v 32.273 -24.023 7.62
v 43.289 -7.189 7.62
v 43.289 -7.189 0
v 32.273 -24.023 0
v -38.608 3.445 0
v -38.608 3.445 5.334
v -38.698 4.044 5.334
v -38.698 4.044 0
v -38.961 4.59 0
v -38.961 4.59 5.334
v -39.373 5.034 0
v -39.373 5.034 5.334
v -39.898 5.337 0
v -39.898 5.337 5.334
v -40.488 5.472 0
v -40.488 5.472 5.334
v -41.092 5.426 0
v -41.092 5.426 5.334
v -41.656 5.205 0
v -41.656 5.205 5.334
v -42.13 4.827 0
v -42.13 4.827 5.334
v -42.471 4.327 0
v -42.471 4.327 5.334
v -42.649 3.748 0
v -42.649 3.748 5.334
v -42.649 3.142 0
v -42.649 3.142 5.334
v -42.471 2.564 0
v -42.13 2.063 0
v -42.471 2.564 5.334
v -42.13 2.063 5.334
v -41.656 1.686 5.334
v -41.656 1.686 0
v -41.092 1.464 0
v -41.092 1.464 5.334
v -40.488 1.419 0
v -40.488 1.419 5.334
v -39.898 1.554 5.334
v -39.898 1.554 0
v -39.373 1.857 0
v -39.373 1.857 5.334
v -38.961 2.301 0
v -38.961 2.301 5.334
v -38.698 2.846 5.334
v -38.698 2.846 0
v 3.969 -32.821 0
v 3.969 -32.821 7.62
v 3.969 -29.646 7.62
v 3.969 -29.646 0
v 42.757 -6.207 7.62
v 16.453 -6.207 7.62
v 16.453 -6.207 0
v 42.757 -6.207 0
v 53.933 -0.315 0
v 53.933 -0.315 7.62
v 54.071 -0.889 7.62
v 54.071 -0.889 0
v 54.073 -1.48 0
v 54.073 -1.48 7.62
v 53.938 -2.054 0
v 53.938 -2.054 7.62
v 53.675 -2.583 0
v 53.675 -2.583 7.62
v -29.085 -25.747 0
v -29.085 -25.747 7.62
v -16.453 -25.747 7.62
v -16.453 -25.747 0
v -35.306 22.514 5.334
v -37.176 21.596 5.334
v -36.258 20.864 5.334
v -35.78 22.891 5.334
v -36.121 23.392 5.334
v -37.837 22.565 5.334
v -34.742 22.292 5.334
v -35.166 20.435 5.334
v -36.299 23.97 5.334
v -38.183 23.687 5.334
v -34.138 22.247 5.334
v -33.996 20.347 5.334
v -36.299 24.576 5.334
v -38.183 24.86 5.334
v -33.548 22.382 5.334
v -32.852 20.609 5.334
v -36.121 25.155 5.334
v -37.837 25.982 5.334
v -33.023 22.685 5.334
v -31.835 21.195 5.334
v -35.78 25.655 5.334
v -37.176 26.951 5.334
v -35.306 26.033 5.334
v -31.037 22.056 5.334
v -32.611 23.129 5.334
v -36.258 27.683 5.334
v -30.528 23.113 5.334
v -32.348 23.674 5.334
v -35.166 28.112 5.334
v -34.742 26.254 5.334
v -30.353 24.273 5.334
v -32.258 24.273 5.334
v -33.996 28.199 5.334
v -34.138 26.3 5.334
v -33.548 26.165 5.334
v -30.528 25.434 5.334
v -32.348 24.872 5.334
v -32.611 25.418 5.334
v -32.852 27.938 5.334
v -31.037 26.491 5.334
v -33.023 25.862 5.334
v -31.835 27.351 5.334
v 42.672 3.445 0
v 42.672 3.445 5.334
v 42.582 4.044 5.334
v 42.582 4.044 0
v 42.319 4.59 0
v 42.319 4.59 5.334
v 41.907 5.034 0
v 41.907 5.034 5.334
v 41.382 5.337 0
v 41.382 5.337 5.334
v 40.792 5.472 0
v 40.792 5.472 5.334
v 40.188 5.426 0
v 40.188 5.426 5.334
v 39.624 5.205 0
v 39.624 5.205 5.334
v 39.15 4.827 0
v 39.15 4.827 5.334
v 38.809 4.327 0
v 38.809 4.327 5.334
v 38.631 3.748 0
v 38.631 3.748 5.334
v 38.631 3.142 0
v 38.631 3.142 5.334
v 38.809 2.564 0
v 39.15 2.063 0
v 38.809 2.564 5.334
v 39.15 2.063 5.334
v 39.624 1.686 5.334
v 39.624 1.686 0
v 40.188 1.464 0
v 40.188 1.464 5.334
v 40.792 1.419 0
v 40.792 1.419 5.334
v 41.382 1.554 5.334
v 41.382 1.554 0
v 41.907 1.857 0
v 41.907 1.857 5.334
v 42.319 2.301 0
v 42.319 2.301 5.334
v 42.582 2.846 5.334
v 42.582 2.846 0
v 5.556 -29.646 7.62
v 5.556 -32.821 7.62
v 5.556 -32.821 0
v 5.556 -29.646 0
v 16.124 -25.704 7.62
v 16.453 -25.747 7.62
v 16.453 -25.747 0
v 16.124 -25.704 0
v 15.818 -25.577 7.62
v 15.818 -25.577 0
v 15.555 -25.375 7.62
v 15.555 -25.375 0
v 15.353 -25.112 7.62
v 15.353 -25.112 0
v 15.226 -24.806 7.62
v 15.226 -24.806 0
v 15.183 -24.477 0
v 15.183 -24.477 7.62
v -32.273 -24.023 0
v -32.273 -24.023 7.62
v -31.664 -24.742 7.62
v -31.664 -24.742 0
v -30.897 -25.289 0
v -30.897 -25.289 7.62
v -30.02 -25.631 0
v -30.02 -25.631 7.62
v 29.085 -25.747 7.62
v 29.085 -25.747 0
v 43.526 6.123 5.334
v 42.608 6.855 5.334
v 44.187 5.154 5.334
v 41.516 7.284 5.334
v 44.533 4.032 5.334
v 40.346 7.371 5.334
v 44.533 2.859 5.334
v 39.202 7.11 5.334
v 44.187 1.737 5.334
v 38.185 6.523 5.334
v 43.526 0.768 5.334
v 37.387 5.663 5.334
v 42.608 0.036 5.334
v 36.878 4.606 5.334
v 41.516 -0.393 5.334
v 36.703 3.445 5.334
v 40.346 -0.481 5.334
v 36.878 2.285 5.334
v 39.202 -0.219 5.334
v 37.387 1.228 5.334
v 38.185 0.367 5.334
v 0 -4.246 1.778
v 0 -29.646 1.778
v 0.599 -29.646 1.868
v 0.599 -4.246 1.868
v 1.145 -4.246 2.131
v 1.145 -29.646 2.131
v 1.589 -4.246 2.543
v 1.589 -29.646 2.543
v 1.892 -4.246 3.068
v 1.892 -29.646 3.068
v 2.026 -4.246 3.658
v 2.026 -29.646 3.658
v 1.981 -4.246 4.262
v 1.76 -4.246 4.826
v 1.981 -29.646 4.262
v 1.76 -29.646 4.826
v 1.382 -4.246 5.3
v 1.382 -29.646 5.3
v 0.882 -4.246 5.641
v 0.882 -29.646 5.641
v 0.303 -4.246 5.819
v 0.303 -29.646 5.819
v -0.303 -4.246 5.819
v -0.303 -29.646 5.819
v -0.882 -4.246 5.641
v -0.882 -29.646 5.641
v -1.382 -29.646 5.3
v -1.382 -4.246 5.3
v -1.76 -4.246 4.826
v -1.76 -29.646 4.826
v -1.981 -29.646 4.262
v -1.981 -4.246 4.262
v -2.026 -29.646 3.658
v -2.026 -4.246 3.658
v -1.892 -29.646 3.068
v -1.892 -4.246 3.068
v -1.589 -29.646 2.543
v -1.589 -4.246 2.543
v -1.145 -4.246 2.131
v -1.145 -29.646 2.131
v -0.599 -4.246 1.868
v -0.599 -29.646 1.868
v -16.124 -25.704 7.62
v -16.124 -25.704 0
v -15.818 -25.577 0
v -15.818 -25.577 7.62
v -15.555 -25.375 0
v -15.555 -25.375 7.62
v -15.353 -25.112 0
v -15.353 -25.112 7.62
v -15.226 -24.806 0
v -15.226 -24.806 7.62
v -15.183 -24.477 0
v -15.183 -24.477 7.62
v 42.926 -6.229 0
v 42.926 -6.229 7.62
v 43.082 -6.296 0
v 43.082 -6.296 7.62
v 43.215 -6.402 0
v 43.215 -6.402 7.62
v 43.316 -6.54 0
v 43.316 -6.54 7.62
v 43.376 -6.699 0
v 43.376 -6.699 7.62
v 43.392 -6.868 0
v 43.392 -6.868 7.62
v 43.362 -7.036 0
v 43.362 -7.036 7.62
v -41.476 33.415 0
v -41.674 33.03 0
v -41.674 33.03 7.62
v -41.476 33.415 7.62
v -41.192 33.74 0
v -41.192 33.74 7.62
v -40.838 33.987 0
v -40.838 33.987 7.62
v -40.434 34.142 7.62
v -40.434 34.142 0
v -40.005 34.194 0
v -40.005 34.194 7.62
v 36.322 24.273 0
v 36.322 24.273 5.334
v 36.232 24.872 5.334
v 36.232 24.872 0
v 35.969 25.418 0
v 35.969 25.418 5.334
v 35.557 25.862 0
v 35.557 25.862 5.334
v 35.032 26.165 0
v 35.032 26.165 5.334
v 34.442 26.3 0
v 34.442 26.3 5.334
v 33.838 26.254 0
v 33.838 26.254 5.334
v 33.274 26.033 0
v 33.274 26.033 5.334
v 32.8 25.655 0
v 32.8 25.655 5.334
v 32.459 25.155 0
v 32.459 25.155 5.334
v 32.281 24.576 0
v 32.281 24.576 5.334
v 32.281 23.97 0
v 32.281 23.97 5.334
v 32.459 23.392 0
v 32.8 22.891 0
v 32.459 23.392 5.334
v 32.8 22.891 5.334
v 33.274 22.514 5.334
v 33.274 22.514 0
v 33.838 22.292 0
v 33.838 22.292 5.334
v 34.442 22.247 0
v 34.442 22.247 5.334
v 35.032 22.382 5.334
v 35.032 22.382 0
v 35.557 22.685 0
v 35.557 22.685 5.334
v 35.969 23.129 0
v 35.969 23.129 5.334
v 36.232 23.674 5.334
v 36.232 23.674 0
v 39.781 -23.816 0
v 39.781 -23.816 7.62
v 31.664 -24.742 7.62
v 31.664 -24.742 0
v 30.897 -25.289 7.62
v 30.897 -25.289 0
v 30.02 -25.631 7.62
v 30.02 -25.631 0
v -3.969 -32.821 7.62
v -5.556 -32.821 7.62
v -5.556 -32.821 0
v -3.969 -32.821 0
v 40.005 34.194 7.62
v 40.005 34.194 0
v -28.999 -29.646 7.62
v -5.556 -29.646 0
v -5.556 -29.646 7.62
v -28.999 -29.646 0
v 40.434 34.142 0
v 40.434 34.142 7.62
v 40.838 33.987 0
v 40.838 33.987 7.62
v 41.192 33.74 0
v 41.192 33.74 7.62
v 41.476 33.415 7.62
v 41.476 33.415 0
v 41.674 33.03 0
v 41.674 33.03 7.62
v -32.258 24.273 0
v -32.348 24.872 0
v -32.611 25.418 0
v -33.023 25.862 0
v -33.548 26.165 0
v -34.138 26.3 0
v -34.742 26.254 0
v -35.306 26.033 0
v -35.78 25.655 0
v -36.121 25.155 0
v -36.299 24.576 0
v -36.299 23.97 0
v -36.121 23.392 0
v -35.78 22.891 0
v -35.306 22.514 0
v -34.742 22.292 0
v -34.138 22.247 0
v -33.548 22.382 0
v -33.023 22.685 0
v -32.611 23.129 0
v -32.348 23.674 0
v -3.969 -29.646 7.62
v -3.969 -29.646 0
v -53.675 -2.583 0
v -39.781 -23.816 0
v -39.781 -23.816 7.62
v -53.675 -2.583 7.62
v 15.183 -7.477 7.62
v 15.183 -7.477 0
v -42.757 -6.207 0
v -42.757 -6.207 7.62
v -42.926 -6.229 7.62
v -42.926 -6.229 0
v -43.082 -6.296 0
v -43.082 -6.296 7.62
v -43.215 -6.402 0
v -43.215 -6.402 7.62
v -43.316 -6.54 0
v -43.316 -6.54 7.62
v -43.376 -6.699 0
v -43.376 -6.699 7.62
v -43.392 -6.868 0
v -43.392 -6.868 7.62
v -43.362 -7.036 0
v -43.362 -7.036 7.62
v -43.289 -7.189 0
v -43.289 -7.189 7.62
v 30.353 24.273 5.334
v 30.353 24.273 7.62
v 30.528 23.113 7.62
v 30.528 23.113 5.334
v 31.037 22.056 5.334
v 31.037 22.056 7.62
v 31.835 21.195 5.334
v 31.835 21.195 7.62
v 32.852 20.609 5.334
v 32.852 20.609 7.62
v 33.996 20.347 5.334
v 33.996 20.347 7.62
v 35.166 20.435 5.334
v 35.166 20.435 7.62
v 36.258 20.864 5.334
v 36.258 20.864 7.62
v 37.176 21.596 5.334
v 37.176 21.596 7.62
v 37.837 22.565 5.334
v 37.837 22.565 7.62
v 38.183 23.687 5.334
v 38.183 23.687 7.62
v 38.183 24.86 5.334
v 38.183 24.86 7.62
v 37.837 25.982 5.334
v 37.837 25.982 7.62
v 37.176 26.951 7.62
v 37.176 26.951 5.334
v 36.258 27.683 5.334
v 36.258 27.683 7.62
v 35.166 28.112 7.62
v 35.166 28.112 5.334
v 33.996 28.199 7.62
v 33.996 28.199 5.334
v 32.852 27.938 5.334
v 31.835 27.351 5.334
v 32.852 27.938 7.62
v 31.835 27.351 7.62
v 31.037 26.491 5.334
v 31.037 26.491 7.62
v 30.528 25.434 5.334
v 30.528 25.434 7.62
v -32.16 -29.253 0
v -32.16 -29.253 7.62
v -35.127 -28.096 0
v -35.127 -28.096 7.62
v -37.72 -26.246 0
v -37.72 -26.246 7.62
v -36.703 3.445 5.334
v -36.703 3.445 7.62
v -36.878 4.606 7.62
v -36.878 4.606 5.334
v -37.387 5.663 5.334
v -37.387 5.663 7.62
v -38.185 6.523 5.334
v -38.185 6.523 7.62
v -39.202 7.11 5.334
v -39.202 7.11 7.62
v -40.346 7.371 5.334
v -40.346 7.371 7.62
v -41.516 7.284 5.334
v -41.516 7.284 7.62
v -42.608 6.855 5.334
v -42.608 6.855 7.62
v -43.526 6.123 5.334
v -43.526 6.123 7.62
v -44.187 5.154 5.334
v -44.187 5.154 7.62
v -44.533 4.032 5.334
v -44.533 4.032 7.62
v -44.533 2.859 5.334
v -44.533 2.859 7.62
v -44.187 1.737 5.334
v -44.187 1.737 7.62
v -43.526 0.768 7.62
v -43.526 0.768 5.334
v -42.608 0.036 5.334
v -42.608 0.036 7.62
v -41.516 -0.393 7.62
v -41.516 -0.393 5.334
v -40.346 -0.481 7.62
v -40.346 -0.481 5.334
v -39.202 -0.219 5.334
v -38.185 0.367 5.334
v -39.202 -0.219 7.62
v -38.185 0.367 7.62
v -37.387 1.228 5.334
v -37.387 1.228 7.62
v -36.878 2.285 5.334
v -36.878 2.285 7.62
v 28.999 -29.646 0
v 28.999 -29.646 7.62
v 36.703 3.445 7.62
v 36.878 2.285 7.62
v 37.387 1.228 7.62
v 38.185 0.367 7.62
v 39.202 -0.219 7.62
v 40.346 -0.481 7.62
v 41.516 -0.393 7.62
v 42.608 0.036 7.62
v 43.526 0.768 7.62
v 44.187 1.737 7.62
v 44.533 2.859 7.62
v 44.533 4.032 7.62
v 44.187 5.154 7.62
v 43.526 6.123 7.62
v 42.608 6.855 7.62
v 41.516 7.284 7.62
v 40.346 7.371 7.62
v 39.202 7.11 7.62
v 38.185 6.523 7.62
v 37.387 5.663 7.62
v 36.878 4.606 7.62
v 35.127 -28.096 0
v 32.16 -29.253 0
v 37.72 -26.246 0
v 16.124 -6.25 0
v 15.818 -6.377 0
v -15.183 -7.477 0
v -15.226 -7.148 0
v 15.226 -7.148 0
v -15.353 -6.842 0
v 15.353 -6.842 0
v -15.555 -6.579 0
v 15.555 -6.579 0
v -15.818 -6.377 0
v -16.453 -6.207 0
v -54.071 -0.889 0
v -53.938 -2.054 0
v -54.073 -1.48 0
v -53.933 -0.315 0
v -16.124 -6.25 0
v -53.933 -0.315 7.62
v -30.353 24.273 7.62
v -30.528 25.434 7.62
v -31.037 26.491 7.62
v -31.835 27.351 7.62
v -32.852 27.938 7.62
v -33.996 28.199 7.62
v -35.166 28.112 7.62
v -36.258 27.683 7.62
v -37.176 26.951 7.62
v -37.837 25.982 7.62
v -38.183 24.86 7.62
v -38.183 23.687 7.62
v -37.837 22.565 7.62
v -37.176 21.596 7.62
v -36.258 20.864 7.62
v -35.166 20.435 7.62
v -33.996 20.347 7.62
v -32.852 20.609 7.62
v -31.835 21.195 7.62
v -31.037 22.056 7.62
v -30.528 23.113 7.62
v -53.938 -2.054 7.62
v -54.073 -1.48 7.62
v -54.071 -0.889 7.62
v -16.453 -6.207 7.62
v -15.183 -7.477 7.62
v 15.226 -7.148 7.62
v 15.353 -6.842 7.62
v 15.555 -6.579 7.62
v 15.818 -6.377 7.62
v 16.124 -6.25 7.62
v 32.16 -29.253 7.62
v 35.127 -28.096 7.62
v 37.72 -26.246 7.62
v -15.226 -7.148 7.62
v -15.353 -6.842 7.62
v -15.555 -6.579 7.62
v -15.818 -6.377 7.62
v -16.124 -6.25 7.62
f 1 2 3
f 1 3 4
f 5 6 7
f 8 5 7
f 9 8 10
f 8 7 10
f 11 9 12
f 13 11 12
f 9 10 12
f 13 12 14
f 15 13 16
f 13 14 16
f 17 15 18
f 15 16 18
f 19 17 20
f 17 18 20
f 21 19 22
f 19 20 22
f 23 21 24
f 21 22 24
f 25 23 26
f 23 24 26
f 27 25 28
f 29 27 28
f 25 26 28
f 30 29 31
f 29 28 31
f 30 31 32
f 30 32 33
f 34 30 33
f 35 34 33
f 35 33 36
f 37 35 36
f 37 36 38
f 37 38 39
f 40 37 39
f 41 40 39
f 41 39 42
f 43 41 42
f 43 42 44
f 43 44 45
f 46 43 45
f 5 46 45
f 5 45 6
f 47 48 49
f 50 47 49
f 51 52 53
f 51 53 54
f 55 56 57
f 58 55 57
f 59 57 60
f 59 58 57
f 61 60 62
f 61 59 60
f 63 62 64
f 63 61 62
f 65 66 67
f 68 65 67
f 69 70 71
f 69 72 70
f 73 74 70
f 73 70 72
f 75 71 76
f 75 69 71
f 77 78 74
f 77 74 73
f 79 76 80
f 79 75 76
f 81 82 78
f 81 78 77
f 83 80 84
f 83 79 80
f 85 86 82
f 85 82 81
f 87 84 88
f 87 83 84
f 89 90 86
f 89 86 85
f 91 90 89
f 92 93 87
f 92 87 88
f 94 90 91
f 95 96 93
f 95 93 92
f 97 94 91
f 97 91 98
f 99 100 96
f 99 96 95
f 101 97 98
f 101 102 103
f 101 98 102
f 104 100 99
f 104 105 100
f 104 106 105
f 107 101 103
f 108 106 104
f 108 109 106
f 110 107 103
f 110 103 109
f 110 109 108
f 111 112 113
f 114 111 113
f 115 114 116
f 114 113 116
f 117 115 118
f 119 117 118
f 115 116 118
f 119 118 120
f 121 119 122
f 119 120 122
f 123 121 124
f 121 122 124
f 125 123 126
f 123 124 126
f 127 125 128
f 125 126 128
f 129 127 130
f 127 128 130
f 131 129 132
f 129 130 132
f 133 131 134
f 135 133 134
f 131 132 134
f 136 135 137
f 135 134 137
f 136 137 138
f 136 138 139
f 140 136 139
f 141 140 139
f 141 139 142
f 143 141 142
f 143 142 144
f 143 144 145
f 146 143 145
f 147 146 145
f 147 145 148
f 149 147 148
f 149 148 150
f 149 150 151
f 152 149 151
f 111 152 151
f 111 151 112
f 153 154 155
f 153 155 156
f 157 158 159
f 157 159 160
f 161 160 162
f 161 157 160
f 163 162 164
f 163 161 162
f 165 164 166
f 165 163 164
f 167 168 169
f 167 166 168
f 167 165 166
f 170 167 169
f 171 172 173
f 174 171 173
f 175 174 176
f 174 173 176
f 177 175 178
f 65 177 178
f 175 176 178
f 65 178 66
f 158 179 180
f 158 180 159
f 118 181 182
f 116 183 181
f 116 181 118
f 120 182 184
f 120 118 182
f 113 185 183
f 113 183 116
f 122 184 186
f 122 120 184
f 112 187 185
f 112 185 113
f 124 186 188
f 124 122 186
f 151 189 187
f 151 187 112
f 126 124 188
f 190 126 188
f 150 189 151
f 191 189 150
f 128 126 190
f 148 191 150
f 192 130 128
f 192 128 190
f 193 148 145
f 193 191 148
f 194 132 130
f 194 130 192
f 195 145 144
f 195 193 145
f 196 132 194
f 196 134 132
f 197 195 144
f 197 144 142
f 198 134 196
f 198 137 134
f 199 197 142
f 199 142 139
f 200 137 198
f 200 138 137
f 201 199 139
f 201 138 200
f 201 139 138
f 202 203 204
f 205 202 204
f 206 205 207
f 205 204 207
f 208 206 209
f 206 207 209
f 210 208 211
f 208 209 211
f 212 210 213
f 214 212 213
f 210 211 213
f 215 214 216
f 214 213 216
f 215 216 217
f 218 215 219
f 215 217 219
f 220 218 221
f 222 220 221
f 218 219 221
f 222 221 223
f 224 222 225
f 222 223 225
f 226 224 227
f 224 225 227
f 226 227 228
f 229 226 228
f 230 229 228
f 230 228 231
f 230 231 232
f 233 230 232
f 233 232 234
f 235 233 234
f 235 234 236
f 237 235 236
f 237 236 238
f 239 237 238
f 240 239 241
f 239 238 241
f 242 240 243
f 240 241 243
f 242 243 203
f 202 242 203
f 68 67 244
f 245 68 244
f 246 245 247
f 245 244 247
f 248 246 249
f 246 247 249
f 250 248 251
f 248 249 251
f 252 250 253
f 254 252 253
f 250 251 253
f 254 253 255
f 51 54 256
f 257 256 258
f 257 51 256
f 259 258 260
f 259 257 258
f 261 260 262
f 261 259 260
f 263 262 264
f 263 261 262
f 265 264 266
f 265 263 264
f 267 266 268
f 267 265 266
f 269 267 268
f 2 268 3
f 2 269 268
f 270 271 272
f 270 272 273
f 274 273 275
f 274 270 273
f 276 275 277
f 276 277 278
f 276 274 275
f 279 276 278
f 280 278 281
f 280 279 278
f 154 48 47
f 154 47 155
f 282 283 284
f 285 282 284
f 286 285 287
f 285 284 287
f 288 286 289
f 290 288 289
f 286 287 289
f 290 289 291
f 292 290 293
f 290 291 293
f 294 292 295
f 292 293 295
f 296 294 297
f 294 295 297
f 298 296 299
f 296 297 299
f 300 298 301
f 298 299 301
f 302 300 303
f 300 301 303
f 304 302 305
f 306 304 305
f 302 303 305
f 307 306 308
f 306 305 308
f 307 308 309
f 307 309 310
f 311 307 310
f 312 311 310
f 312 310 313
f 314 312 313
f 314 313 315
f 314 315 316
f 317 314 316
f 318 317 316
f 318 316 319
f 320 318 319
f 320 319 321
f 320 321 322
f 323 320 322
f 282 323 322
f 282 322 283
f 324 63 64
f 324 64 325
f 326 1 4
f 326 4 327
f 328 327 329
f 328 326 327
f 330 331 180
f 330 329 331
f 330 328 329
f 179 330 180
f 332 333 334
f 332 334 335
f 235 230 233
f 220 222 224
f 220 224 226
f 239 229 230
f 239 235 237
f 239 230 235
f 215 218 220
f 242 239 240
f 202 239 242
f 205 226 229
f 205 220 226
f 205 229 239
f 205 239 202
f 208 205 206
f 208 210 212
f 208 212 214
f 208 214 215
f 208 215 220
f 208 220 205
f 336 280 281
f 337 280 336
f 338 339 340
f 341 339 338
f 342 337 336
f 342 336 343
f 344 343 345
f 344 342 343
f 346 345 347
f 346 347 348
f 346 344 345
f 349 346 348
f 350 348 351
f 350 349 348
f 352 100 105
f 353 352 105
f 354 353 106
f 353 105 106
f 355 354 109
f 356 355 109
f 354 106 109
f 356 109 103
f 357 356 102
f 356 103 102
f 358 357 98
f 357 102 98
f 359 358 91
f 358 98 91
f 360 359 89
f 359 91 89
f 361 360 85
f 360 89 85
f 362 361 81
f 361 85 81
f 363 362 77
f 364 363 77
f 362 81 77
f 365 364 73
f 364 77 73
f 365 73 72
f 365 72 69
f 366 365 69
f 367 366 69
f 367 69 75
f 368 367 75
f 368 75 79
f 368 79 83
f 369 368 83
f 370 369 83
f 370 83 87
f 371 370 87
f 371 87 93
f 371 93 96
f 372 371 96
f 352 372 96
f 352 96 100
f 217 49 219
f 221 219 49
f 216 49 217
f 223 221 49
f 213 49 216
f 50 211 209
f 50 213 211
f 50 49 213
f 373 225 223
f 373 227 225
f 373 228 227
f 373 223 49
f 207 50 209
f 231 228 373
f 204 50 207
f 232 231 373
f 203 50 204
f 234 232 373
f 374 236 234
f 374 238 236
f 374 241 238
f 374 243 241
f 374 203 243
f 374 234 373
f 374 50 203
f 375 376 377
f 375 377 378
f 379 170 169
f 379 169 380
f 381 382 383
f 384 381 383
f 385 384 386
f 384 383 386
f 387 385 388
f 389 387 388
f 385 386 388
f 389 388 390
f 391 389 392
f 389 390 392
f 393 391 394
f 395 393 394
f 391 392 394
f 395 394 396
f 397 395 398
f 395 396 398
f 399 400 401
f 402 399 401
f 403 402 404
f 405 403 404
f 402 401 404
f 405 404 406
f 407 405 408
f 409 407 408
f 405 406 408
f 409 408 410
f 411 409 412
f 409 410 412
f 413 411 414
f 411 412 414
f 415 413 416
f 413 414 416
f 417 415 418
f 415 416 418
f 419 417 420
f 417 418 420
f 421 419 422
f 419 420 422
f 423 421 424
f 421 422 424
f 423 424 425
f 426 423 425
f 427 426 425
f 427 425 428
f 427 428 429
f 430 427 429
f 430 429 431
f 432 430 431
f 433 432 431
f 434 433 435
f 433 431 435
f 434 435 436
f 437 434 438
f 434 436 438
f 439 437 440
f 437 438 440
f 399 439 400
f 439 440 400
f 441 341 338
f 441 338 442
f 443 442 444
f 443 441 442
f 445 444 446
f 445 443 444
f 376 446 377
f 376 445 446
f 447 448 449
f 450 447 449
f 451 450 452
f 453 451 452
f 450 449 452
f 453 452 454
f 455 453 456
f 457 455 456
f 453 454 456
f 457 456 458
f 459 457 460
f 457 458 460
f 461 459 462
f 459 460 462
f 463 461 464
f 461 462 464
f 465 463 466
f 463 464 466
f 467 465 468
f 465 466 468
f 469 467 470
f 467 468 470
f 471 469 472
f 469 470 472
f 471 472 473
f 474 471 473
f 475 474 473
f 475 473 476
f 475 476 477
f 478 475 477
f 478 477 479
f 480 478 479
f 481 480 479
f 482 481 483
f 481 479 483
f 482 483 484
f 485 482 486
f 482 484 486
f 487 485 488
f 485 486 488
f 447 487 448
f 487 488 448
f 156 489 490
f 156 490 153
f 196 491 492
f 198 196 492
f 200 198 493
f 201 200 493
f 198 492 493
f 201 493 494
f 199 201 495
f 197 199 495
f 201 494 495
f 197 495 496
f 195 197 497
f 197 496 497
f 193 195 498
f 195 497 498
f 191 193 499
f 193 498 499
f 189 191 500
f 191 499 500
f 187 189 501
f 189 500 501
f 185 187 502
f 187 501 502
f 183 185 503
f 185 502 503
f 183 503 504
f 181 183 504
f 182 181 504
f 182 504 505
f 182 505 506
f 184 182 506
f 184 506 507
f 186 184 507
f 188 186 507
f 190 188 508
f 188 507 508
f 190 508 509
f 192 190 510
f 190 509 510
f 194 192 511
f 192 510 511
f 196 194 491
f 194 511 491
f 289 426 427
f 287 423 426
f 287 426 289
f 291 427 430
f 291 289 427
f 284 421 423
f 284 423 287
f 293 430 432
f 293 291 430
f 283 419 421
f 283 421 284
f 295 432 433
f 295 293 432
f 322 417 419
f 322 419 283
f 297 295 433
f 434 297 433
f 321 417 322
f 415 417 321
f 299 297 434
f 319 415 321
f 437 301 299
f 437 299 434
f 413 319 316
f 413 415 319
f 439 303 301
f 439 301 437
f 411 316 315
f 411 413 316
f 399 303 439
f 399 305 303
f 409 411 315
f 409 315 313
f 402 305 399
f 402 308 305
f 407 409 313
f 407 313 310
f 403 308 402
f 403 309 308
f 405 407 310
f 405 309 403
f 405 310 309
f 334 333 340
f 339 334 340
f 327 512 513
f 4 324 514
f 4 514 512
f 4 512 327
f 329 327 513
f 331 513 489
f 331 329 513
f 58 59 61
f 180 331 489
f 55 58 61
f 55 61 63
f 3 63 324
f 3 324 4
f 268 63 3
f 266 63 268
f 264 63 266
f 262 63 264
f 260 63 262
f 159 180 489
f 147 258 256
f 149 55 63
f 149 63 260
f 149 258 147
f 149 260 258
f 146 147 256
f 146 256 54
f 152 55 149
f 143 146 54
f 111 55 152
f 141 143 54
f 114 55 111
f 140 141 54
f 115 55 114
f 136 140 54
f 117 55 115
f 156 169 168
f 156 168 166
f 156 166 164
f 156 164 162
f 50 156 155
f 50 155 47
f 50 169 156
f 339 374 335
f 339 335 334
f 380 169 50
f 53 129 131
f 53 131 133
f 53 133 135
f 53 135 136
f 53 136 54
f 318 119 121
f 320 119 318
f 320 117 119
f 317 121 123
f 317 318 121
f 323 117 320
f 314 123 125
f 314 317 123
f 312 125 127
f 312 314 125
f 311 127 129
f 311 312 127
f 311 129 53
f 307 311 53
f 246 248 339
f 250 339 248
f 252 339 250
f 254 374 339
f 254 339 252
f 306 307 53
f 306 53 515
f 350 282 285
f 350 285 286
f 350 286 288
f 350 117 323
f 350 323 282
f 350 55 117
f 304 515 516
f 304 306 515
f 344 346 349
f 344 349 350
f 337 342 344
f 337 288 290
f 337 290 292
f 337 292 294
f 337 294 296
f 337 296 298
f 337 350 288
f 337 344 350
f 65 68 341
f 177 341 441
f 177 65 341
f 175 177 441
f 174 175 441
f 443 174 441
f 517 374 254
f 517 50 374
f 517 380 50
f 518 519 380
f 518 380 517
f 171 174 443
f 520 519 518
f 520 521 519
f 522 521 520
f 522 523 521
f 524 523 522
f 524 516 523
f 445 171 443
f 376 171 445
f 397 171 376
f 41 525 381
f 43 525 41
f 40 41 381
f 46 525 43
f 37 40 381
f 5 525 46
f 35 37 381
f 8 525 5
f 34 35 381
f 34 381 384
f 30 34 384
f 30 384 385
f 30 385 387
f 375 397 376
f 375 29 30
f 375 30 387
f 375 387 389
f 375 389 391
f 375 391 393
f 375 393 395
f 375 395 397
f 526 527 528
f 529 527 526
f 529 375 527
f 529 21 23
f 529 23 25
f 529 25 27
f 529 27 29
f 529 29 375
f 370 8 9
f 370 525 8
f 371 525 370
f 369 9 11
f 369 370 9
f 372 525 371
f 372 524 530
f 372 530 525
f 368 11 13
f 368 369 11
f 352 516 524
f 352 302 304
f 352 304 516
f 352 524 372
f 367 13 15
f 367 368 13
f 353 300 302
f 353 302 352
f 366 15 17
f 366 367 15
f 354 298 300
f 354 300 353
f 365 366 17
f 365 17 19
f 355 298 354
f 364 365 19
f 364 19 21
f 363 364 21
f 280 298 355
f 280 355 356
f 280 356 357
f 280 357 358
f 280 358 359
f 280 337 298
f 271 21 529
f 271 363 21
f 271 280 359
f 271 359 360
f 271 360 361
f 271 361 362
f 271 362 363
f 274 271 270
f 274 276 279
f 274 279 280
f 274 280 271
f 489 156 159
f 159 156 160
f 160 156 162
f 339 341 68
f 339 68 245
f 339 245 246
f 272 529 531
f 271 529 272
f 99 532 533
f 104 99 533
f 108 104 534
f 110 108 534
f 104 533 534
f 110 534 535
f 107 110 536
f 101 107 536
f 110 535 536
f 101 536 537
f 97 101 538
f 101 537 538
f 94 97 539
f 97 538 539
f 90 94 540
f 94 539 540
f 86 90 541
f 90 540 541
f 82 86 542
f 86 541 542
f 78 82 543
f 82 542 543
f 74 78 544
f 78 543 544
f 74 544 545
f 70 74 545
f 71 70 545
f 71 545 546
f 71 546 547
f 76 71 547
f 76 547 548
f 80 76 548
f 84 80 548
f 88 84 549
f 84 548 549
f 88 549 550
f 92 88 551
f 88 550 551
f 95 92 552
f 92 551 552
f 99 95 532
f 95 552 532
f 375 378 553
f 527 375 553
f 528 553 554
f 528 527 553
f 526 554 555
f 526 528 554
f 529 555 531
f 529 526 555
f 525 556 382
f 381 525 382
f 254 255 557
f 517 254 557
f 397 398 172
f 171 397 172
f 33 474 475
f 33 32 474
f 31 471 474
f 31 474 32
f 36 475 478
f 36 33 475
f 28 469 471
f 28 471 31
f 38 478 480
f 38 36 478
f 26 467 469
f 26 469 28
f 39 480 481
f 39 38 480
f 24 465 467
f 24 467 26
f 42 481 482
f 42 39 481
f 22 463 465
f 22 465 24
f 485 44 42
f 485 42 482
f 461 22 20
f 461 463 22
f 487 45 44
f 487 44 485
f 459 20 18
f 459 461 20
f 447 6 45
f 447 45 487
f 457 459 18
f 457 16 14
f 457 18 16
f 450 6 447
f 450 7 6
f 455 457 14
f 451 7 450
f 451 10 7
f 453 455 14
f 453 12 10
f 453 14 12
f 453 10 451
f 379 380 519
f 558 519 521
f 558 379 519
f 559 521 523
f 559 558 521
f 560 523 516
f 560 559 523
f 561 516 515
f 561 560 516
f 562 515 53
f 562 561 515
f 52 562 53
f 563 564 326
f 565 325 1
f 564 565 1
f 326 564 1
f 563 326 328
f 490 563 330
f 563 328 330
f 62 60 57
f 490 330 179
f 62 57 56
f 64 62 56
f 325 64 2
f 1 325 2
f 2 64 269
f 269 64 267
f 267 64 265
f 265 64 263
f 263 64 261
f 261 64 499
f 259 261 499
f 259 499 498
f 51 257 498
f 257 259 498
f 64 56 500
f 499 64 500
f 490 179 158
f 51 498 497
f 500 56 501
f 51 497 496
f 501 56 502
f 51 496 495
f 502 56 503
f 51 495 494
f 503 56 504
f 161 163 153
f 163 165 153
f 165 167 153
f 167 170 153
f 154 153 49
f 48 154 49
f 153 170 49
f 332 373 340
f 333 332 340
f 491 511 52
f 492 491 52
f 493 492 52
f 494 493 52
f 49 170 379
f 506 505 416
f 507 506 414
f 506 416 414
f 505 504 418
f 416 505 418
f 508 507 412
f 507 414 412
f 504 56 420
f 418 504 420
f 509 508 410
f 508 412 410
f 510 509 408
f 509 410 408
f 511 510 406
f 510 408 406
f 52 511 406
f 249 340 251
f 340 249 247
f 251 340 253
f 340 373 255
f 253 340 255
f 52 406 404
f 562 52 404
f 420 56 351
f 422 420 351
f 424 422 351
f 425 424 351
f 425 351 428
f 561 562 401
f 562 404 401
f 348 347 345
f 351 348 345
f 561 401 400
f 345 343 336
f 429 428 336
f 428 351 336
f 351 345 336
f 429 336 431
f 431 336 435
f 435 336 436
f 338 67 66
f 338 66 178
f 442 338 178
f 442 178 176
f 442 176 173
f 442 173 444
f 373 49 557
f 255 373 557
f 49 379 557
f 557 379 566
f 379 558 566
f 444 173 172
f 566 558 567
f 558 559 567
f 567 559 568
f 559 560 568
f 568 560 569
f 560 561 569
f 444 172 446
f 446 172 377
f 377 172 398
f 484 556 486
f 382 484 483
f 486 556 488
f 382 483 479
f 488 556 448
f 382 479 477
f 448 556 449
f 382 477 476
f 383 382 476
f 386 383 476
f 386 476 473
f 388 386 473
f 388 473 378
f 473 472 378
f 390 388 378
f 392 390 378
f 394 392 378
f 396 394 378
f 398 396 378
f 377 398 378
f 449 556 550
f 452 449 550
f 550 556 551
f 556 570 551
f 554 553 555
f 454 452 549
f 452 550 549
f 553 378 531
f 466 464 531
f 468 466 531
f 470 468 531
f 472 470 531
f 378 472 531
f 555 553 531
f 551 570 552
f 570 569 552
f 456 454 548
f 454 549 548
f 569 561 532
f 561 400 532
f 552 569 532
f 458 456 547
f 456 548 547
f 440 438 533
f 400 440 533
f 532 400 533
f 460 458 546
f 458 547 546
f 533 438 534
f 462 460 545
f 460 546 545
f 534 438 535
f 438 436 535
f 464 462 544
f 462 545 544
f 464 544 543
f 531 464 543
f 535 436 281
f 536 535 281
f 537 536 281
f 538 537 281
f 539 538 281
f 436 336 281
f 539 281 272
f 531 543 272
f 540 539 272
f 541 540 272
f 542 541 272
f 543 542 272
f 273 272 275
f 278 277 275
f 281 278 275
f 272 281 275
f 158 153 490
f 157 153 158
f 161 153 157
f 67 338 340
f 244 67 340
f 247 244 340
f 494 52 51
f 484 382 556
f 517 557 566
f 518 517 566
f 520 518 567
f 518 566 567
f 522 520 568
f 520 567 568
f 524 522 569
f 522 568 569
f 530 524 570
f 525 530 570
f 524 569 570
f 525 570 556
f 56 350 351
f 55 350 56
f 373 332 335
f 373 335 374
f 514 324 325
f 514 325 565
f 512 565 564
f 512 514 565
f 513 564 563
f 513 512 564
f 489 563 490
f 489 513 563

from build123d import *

# Parameters (mm, degrees)
BOSS_EXTRUDE1_DEPTH = 7.62
CUT_EXTRUDE4_DEPTH  = 65.443482206
SKETCH8_R           = 2.032
CUT_EXTRUDE6_DEPTH  = 65.443482206
SKETCH9_R           = 2.032
CUT_EXTRUDE7_DEPTH  = 25.4
SKETCH11_R          = 3.937
CUT_EXTRUDE9_DEPTH  = 2.286
SKETCH12_W          = 1.5875
SKETCH12_H          = 3.175
BOSS_EXTRUDE2_DEPTH = 7.62


with BuildPart() as part:
    # Sketch2 → Boss-Extrude1 (new body)
    with BuildSketch(Plane.XY):
        with BuildLine():
            Line((-53.9331315, -0.315391151), (-41.673792668, 33.030010472))
            ThreePointArc((-41.673792668, 33.030010472), (-41.022456018, 33.874587748), (-40.005, 34.194483756))
            Line((-40.005, 34.194483756), (40.005, 34.194483756))
            ThreePointArc((40.005, 34.194483756), (41.022456018, 33.874587748), (41.673792668, 33.030010472))
            Line((41.673792668, 33.030010472), (53.9331315, -0.315391151))
            ThreePointArc((53.9331315, -0.315391151), (54.072783991, -1.479661595), (53.674573059, -2.582592481))
            Line((53.674573059, -2.582592481), (39.780650937, -23.816388011))
            ThreePointArc((39.780650937, -23.816388011), (35.127277075, -28.095614939), (28.998611748, -29.64646397))
            Line((28.998611748, -29.64646397), (-28.998611748, -29.64646397))
            ThreePointArc((-28.998611748, -29.64646397), (-35.127277075, -28.095614939), (-39.780650937, -23.816388011))
            Line((-39.780650937, -23.816388011), (-53.674573059, -2.582592481))
            ThreePointArc((-53.674573059, -2.582592481), (-54.072783991, -1.479661595), (-53.9331315, -0.315391151))
        make_face()
    extrude(amount=BOSS_EXTRUDE1_DEPTH)

    # Sketch6 → Cut-Extrude4 (cut, through all)
    with BuildSketch(Plane.XY.offset(7.62)):
        with BuildLine():
            Line((-43.288518763, -7.189330581), (-32.273407011, -24.02349941))
            ThreePointArc((-32.273407011, -24.02349941), (-30.897448537, -25.288826187), (-29.085260384, -25.747397522))
            Line((-29.085260384, -25.747397522), (-16.452977044, -25.747397522))
            ThreePointArc((-16.452977044, -25.747397522), (-15.554951432, -25.375423134), (-15.182977044, -24.477397522))
            Line((-15.182977044, -24.477397522), (-15.182977044, -7.476646933))
            ThreePointArc((-15.182977044, -7.476646933), (-15.554951432, -6.578621321), (-16.452977044, -6.206646933))
            Line((-16.452977044, -6.206646933), (-42.757160992, -6.206646933))
            ThreePointArc((-42.757160992, -6.206646933), (-43.315732436, -6.539615574), (-43.288518763, -7.189330581))
        make_face()
        with BuildLine():
            Line((43.288518763, -7.189330581), (32.273407011, -24.02349941))
            ThreePointArc((32.273407011, -24.02349941), (30.897448537, -25.288826187), (29.085260384, -25.747397522))
            Line((29.085260384, -25.747397522), (16.452977044, -25.747397522))
            ThreePointArc((16.452977044, -25.747397522), (15.554951432, -25.375423134), (15.182977044, -24.477397522))
            Line((15.182977044, -24.477397522), (15.182977044, -7.476646933))
            ThreePointArc((15.182977044, -7.476646933), (15.554951432, -6.578621321), (16.452977044, -6.206646933))
            Line((16.452977044, -6.206646933), (42.757160992, -6.206646933))
            ThreePointArc((42.757160992, -6.206646933), (43.315732436, -6.539615574), (43.288518763, -7.189330581))
        make_face()
    extrude(amount=-CUT_EXTRUDE4_DEPTH, mode=Mode.SUBTRACT)

    # Sketch8 → Cut-Extrude6 (cut, through all)
    with BuildSketch(Plane.XY.offset(7.62)):
        with Locations((-40.64, 3.445353067)):
            Circle(SKETCH8_R)
        with Locations((-34.29, 24.273353067)):
            Circle(SKETCH8_R)
        with Locations((40.64, 3.445353067)):
            Circle(SKETCH8_R)
        with Locations((34.29, 24.273353067)):
            Circle(SKETCH8_R)
    extrude(amount=-CUT_EXTRUDE6_DEPTH, mode=Mode.SUBTRACT)

    # Sketch9 → Cut-Extrude7 (cut)
    with BuildSketch(Plane.XZ.offset(29.64646397)):
        with Locations(Location((0, 3.81, 0), (0, 0, 270))):
            Circle(SKETCH9_R)
    extrude(amount=-CUT_EXTRUDE7_DEPTH, mode=Mode.SUBTRACT)

    # Sketch11 → Cut-Extrude9 (cut)
    with BuildSketch(Plane.XY.offset(7.62)):
        with Locations((-34.29, 24.273353067)):
            Circle(SKETCH11_R)
        with Locations((-40.64, 3.445353067)):
            Circle(SKETCH11_R)
        with Locations(Location((40.64, 3.445353067, 0), (0, 0, 180))):
            Circle(SKETCH11_R)
        with Locations(Location((34.29, 24.273353067, 0), (0, 0, 180))):
            Circle(SKETCH11_R)
    extrude(amount=-CUT_EXTRUDE9_DEPTH, mode=Mode.SUBTRACT)

    # Sketch12 → Boss-Extrude2 (add)
    with BuildSketch(Plane.XY.offset(7.62)):
        with Locations((-4.7625, -31.23396397)):
            Rectangle(SKETCH12_W, SKETCH12_H)
        with Locations((4.7625, -31.23396397)):
            Rectangle(SKETCH12_W, SKETCH12_H)
    extrude(amount=-BOSS_EXTRUDE2_DEPTH)


solid = part.part
